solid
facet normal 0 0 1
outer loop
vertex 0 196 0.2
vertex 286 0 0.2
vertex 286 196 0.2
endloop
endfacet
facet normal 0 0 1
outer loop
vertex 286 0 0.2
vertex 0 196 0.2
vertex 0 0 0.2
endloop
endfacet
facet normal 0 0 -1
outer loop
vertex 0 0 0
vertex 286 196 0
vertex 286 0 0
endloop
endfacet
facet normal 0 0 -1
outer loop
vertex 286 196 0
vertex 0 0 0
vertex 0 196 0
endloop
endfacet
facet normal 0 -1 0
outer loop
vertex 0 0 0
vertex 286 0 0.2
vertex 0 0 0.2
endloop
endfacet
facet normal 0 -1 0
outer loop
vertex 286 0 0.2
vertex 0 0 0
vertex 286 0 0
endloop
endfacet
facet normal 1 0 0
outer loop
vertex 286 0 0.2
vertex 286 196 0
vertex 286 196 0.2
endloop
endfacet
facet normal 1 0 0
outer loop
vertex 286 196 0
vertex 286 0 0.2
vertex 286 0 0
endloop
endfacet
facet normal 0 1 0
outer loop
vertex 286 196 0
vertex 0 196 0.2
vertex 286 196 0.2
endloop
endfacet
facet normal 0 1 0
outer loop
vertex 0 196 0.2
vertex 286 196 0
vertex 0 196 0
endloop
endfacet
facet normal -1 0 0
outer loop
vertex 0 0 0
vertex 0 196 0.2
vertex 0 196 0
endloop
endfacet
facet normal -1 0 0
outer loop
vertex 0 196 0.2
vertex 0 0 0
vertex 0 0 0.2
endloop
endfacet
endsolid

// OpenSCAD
$fa=4; $fs=0.4;
color("#000000") translate([0.000,0.000,0.000]) cube([286.000,196.000,0.200]);
